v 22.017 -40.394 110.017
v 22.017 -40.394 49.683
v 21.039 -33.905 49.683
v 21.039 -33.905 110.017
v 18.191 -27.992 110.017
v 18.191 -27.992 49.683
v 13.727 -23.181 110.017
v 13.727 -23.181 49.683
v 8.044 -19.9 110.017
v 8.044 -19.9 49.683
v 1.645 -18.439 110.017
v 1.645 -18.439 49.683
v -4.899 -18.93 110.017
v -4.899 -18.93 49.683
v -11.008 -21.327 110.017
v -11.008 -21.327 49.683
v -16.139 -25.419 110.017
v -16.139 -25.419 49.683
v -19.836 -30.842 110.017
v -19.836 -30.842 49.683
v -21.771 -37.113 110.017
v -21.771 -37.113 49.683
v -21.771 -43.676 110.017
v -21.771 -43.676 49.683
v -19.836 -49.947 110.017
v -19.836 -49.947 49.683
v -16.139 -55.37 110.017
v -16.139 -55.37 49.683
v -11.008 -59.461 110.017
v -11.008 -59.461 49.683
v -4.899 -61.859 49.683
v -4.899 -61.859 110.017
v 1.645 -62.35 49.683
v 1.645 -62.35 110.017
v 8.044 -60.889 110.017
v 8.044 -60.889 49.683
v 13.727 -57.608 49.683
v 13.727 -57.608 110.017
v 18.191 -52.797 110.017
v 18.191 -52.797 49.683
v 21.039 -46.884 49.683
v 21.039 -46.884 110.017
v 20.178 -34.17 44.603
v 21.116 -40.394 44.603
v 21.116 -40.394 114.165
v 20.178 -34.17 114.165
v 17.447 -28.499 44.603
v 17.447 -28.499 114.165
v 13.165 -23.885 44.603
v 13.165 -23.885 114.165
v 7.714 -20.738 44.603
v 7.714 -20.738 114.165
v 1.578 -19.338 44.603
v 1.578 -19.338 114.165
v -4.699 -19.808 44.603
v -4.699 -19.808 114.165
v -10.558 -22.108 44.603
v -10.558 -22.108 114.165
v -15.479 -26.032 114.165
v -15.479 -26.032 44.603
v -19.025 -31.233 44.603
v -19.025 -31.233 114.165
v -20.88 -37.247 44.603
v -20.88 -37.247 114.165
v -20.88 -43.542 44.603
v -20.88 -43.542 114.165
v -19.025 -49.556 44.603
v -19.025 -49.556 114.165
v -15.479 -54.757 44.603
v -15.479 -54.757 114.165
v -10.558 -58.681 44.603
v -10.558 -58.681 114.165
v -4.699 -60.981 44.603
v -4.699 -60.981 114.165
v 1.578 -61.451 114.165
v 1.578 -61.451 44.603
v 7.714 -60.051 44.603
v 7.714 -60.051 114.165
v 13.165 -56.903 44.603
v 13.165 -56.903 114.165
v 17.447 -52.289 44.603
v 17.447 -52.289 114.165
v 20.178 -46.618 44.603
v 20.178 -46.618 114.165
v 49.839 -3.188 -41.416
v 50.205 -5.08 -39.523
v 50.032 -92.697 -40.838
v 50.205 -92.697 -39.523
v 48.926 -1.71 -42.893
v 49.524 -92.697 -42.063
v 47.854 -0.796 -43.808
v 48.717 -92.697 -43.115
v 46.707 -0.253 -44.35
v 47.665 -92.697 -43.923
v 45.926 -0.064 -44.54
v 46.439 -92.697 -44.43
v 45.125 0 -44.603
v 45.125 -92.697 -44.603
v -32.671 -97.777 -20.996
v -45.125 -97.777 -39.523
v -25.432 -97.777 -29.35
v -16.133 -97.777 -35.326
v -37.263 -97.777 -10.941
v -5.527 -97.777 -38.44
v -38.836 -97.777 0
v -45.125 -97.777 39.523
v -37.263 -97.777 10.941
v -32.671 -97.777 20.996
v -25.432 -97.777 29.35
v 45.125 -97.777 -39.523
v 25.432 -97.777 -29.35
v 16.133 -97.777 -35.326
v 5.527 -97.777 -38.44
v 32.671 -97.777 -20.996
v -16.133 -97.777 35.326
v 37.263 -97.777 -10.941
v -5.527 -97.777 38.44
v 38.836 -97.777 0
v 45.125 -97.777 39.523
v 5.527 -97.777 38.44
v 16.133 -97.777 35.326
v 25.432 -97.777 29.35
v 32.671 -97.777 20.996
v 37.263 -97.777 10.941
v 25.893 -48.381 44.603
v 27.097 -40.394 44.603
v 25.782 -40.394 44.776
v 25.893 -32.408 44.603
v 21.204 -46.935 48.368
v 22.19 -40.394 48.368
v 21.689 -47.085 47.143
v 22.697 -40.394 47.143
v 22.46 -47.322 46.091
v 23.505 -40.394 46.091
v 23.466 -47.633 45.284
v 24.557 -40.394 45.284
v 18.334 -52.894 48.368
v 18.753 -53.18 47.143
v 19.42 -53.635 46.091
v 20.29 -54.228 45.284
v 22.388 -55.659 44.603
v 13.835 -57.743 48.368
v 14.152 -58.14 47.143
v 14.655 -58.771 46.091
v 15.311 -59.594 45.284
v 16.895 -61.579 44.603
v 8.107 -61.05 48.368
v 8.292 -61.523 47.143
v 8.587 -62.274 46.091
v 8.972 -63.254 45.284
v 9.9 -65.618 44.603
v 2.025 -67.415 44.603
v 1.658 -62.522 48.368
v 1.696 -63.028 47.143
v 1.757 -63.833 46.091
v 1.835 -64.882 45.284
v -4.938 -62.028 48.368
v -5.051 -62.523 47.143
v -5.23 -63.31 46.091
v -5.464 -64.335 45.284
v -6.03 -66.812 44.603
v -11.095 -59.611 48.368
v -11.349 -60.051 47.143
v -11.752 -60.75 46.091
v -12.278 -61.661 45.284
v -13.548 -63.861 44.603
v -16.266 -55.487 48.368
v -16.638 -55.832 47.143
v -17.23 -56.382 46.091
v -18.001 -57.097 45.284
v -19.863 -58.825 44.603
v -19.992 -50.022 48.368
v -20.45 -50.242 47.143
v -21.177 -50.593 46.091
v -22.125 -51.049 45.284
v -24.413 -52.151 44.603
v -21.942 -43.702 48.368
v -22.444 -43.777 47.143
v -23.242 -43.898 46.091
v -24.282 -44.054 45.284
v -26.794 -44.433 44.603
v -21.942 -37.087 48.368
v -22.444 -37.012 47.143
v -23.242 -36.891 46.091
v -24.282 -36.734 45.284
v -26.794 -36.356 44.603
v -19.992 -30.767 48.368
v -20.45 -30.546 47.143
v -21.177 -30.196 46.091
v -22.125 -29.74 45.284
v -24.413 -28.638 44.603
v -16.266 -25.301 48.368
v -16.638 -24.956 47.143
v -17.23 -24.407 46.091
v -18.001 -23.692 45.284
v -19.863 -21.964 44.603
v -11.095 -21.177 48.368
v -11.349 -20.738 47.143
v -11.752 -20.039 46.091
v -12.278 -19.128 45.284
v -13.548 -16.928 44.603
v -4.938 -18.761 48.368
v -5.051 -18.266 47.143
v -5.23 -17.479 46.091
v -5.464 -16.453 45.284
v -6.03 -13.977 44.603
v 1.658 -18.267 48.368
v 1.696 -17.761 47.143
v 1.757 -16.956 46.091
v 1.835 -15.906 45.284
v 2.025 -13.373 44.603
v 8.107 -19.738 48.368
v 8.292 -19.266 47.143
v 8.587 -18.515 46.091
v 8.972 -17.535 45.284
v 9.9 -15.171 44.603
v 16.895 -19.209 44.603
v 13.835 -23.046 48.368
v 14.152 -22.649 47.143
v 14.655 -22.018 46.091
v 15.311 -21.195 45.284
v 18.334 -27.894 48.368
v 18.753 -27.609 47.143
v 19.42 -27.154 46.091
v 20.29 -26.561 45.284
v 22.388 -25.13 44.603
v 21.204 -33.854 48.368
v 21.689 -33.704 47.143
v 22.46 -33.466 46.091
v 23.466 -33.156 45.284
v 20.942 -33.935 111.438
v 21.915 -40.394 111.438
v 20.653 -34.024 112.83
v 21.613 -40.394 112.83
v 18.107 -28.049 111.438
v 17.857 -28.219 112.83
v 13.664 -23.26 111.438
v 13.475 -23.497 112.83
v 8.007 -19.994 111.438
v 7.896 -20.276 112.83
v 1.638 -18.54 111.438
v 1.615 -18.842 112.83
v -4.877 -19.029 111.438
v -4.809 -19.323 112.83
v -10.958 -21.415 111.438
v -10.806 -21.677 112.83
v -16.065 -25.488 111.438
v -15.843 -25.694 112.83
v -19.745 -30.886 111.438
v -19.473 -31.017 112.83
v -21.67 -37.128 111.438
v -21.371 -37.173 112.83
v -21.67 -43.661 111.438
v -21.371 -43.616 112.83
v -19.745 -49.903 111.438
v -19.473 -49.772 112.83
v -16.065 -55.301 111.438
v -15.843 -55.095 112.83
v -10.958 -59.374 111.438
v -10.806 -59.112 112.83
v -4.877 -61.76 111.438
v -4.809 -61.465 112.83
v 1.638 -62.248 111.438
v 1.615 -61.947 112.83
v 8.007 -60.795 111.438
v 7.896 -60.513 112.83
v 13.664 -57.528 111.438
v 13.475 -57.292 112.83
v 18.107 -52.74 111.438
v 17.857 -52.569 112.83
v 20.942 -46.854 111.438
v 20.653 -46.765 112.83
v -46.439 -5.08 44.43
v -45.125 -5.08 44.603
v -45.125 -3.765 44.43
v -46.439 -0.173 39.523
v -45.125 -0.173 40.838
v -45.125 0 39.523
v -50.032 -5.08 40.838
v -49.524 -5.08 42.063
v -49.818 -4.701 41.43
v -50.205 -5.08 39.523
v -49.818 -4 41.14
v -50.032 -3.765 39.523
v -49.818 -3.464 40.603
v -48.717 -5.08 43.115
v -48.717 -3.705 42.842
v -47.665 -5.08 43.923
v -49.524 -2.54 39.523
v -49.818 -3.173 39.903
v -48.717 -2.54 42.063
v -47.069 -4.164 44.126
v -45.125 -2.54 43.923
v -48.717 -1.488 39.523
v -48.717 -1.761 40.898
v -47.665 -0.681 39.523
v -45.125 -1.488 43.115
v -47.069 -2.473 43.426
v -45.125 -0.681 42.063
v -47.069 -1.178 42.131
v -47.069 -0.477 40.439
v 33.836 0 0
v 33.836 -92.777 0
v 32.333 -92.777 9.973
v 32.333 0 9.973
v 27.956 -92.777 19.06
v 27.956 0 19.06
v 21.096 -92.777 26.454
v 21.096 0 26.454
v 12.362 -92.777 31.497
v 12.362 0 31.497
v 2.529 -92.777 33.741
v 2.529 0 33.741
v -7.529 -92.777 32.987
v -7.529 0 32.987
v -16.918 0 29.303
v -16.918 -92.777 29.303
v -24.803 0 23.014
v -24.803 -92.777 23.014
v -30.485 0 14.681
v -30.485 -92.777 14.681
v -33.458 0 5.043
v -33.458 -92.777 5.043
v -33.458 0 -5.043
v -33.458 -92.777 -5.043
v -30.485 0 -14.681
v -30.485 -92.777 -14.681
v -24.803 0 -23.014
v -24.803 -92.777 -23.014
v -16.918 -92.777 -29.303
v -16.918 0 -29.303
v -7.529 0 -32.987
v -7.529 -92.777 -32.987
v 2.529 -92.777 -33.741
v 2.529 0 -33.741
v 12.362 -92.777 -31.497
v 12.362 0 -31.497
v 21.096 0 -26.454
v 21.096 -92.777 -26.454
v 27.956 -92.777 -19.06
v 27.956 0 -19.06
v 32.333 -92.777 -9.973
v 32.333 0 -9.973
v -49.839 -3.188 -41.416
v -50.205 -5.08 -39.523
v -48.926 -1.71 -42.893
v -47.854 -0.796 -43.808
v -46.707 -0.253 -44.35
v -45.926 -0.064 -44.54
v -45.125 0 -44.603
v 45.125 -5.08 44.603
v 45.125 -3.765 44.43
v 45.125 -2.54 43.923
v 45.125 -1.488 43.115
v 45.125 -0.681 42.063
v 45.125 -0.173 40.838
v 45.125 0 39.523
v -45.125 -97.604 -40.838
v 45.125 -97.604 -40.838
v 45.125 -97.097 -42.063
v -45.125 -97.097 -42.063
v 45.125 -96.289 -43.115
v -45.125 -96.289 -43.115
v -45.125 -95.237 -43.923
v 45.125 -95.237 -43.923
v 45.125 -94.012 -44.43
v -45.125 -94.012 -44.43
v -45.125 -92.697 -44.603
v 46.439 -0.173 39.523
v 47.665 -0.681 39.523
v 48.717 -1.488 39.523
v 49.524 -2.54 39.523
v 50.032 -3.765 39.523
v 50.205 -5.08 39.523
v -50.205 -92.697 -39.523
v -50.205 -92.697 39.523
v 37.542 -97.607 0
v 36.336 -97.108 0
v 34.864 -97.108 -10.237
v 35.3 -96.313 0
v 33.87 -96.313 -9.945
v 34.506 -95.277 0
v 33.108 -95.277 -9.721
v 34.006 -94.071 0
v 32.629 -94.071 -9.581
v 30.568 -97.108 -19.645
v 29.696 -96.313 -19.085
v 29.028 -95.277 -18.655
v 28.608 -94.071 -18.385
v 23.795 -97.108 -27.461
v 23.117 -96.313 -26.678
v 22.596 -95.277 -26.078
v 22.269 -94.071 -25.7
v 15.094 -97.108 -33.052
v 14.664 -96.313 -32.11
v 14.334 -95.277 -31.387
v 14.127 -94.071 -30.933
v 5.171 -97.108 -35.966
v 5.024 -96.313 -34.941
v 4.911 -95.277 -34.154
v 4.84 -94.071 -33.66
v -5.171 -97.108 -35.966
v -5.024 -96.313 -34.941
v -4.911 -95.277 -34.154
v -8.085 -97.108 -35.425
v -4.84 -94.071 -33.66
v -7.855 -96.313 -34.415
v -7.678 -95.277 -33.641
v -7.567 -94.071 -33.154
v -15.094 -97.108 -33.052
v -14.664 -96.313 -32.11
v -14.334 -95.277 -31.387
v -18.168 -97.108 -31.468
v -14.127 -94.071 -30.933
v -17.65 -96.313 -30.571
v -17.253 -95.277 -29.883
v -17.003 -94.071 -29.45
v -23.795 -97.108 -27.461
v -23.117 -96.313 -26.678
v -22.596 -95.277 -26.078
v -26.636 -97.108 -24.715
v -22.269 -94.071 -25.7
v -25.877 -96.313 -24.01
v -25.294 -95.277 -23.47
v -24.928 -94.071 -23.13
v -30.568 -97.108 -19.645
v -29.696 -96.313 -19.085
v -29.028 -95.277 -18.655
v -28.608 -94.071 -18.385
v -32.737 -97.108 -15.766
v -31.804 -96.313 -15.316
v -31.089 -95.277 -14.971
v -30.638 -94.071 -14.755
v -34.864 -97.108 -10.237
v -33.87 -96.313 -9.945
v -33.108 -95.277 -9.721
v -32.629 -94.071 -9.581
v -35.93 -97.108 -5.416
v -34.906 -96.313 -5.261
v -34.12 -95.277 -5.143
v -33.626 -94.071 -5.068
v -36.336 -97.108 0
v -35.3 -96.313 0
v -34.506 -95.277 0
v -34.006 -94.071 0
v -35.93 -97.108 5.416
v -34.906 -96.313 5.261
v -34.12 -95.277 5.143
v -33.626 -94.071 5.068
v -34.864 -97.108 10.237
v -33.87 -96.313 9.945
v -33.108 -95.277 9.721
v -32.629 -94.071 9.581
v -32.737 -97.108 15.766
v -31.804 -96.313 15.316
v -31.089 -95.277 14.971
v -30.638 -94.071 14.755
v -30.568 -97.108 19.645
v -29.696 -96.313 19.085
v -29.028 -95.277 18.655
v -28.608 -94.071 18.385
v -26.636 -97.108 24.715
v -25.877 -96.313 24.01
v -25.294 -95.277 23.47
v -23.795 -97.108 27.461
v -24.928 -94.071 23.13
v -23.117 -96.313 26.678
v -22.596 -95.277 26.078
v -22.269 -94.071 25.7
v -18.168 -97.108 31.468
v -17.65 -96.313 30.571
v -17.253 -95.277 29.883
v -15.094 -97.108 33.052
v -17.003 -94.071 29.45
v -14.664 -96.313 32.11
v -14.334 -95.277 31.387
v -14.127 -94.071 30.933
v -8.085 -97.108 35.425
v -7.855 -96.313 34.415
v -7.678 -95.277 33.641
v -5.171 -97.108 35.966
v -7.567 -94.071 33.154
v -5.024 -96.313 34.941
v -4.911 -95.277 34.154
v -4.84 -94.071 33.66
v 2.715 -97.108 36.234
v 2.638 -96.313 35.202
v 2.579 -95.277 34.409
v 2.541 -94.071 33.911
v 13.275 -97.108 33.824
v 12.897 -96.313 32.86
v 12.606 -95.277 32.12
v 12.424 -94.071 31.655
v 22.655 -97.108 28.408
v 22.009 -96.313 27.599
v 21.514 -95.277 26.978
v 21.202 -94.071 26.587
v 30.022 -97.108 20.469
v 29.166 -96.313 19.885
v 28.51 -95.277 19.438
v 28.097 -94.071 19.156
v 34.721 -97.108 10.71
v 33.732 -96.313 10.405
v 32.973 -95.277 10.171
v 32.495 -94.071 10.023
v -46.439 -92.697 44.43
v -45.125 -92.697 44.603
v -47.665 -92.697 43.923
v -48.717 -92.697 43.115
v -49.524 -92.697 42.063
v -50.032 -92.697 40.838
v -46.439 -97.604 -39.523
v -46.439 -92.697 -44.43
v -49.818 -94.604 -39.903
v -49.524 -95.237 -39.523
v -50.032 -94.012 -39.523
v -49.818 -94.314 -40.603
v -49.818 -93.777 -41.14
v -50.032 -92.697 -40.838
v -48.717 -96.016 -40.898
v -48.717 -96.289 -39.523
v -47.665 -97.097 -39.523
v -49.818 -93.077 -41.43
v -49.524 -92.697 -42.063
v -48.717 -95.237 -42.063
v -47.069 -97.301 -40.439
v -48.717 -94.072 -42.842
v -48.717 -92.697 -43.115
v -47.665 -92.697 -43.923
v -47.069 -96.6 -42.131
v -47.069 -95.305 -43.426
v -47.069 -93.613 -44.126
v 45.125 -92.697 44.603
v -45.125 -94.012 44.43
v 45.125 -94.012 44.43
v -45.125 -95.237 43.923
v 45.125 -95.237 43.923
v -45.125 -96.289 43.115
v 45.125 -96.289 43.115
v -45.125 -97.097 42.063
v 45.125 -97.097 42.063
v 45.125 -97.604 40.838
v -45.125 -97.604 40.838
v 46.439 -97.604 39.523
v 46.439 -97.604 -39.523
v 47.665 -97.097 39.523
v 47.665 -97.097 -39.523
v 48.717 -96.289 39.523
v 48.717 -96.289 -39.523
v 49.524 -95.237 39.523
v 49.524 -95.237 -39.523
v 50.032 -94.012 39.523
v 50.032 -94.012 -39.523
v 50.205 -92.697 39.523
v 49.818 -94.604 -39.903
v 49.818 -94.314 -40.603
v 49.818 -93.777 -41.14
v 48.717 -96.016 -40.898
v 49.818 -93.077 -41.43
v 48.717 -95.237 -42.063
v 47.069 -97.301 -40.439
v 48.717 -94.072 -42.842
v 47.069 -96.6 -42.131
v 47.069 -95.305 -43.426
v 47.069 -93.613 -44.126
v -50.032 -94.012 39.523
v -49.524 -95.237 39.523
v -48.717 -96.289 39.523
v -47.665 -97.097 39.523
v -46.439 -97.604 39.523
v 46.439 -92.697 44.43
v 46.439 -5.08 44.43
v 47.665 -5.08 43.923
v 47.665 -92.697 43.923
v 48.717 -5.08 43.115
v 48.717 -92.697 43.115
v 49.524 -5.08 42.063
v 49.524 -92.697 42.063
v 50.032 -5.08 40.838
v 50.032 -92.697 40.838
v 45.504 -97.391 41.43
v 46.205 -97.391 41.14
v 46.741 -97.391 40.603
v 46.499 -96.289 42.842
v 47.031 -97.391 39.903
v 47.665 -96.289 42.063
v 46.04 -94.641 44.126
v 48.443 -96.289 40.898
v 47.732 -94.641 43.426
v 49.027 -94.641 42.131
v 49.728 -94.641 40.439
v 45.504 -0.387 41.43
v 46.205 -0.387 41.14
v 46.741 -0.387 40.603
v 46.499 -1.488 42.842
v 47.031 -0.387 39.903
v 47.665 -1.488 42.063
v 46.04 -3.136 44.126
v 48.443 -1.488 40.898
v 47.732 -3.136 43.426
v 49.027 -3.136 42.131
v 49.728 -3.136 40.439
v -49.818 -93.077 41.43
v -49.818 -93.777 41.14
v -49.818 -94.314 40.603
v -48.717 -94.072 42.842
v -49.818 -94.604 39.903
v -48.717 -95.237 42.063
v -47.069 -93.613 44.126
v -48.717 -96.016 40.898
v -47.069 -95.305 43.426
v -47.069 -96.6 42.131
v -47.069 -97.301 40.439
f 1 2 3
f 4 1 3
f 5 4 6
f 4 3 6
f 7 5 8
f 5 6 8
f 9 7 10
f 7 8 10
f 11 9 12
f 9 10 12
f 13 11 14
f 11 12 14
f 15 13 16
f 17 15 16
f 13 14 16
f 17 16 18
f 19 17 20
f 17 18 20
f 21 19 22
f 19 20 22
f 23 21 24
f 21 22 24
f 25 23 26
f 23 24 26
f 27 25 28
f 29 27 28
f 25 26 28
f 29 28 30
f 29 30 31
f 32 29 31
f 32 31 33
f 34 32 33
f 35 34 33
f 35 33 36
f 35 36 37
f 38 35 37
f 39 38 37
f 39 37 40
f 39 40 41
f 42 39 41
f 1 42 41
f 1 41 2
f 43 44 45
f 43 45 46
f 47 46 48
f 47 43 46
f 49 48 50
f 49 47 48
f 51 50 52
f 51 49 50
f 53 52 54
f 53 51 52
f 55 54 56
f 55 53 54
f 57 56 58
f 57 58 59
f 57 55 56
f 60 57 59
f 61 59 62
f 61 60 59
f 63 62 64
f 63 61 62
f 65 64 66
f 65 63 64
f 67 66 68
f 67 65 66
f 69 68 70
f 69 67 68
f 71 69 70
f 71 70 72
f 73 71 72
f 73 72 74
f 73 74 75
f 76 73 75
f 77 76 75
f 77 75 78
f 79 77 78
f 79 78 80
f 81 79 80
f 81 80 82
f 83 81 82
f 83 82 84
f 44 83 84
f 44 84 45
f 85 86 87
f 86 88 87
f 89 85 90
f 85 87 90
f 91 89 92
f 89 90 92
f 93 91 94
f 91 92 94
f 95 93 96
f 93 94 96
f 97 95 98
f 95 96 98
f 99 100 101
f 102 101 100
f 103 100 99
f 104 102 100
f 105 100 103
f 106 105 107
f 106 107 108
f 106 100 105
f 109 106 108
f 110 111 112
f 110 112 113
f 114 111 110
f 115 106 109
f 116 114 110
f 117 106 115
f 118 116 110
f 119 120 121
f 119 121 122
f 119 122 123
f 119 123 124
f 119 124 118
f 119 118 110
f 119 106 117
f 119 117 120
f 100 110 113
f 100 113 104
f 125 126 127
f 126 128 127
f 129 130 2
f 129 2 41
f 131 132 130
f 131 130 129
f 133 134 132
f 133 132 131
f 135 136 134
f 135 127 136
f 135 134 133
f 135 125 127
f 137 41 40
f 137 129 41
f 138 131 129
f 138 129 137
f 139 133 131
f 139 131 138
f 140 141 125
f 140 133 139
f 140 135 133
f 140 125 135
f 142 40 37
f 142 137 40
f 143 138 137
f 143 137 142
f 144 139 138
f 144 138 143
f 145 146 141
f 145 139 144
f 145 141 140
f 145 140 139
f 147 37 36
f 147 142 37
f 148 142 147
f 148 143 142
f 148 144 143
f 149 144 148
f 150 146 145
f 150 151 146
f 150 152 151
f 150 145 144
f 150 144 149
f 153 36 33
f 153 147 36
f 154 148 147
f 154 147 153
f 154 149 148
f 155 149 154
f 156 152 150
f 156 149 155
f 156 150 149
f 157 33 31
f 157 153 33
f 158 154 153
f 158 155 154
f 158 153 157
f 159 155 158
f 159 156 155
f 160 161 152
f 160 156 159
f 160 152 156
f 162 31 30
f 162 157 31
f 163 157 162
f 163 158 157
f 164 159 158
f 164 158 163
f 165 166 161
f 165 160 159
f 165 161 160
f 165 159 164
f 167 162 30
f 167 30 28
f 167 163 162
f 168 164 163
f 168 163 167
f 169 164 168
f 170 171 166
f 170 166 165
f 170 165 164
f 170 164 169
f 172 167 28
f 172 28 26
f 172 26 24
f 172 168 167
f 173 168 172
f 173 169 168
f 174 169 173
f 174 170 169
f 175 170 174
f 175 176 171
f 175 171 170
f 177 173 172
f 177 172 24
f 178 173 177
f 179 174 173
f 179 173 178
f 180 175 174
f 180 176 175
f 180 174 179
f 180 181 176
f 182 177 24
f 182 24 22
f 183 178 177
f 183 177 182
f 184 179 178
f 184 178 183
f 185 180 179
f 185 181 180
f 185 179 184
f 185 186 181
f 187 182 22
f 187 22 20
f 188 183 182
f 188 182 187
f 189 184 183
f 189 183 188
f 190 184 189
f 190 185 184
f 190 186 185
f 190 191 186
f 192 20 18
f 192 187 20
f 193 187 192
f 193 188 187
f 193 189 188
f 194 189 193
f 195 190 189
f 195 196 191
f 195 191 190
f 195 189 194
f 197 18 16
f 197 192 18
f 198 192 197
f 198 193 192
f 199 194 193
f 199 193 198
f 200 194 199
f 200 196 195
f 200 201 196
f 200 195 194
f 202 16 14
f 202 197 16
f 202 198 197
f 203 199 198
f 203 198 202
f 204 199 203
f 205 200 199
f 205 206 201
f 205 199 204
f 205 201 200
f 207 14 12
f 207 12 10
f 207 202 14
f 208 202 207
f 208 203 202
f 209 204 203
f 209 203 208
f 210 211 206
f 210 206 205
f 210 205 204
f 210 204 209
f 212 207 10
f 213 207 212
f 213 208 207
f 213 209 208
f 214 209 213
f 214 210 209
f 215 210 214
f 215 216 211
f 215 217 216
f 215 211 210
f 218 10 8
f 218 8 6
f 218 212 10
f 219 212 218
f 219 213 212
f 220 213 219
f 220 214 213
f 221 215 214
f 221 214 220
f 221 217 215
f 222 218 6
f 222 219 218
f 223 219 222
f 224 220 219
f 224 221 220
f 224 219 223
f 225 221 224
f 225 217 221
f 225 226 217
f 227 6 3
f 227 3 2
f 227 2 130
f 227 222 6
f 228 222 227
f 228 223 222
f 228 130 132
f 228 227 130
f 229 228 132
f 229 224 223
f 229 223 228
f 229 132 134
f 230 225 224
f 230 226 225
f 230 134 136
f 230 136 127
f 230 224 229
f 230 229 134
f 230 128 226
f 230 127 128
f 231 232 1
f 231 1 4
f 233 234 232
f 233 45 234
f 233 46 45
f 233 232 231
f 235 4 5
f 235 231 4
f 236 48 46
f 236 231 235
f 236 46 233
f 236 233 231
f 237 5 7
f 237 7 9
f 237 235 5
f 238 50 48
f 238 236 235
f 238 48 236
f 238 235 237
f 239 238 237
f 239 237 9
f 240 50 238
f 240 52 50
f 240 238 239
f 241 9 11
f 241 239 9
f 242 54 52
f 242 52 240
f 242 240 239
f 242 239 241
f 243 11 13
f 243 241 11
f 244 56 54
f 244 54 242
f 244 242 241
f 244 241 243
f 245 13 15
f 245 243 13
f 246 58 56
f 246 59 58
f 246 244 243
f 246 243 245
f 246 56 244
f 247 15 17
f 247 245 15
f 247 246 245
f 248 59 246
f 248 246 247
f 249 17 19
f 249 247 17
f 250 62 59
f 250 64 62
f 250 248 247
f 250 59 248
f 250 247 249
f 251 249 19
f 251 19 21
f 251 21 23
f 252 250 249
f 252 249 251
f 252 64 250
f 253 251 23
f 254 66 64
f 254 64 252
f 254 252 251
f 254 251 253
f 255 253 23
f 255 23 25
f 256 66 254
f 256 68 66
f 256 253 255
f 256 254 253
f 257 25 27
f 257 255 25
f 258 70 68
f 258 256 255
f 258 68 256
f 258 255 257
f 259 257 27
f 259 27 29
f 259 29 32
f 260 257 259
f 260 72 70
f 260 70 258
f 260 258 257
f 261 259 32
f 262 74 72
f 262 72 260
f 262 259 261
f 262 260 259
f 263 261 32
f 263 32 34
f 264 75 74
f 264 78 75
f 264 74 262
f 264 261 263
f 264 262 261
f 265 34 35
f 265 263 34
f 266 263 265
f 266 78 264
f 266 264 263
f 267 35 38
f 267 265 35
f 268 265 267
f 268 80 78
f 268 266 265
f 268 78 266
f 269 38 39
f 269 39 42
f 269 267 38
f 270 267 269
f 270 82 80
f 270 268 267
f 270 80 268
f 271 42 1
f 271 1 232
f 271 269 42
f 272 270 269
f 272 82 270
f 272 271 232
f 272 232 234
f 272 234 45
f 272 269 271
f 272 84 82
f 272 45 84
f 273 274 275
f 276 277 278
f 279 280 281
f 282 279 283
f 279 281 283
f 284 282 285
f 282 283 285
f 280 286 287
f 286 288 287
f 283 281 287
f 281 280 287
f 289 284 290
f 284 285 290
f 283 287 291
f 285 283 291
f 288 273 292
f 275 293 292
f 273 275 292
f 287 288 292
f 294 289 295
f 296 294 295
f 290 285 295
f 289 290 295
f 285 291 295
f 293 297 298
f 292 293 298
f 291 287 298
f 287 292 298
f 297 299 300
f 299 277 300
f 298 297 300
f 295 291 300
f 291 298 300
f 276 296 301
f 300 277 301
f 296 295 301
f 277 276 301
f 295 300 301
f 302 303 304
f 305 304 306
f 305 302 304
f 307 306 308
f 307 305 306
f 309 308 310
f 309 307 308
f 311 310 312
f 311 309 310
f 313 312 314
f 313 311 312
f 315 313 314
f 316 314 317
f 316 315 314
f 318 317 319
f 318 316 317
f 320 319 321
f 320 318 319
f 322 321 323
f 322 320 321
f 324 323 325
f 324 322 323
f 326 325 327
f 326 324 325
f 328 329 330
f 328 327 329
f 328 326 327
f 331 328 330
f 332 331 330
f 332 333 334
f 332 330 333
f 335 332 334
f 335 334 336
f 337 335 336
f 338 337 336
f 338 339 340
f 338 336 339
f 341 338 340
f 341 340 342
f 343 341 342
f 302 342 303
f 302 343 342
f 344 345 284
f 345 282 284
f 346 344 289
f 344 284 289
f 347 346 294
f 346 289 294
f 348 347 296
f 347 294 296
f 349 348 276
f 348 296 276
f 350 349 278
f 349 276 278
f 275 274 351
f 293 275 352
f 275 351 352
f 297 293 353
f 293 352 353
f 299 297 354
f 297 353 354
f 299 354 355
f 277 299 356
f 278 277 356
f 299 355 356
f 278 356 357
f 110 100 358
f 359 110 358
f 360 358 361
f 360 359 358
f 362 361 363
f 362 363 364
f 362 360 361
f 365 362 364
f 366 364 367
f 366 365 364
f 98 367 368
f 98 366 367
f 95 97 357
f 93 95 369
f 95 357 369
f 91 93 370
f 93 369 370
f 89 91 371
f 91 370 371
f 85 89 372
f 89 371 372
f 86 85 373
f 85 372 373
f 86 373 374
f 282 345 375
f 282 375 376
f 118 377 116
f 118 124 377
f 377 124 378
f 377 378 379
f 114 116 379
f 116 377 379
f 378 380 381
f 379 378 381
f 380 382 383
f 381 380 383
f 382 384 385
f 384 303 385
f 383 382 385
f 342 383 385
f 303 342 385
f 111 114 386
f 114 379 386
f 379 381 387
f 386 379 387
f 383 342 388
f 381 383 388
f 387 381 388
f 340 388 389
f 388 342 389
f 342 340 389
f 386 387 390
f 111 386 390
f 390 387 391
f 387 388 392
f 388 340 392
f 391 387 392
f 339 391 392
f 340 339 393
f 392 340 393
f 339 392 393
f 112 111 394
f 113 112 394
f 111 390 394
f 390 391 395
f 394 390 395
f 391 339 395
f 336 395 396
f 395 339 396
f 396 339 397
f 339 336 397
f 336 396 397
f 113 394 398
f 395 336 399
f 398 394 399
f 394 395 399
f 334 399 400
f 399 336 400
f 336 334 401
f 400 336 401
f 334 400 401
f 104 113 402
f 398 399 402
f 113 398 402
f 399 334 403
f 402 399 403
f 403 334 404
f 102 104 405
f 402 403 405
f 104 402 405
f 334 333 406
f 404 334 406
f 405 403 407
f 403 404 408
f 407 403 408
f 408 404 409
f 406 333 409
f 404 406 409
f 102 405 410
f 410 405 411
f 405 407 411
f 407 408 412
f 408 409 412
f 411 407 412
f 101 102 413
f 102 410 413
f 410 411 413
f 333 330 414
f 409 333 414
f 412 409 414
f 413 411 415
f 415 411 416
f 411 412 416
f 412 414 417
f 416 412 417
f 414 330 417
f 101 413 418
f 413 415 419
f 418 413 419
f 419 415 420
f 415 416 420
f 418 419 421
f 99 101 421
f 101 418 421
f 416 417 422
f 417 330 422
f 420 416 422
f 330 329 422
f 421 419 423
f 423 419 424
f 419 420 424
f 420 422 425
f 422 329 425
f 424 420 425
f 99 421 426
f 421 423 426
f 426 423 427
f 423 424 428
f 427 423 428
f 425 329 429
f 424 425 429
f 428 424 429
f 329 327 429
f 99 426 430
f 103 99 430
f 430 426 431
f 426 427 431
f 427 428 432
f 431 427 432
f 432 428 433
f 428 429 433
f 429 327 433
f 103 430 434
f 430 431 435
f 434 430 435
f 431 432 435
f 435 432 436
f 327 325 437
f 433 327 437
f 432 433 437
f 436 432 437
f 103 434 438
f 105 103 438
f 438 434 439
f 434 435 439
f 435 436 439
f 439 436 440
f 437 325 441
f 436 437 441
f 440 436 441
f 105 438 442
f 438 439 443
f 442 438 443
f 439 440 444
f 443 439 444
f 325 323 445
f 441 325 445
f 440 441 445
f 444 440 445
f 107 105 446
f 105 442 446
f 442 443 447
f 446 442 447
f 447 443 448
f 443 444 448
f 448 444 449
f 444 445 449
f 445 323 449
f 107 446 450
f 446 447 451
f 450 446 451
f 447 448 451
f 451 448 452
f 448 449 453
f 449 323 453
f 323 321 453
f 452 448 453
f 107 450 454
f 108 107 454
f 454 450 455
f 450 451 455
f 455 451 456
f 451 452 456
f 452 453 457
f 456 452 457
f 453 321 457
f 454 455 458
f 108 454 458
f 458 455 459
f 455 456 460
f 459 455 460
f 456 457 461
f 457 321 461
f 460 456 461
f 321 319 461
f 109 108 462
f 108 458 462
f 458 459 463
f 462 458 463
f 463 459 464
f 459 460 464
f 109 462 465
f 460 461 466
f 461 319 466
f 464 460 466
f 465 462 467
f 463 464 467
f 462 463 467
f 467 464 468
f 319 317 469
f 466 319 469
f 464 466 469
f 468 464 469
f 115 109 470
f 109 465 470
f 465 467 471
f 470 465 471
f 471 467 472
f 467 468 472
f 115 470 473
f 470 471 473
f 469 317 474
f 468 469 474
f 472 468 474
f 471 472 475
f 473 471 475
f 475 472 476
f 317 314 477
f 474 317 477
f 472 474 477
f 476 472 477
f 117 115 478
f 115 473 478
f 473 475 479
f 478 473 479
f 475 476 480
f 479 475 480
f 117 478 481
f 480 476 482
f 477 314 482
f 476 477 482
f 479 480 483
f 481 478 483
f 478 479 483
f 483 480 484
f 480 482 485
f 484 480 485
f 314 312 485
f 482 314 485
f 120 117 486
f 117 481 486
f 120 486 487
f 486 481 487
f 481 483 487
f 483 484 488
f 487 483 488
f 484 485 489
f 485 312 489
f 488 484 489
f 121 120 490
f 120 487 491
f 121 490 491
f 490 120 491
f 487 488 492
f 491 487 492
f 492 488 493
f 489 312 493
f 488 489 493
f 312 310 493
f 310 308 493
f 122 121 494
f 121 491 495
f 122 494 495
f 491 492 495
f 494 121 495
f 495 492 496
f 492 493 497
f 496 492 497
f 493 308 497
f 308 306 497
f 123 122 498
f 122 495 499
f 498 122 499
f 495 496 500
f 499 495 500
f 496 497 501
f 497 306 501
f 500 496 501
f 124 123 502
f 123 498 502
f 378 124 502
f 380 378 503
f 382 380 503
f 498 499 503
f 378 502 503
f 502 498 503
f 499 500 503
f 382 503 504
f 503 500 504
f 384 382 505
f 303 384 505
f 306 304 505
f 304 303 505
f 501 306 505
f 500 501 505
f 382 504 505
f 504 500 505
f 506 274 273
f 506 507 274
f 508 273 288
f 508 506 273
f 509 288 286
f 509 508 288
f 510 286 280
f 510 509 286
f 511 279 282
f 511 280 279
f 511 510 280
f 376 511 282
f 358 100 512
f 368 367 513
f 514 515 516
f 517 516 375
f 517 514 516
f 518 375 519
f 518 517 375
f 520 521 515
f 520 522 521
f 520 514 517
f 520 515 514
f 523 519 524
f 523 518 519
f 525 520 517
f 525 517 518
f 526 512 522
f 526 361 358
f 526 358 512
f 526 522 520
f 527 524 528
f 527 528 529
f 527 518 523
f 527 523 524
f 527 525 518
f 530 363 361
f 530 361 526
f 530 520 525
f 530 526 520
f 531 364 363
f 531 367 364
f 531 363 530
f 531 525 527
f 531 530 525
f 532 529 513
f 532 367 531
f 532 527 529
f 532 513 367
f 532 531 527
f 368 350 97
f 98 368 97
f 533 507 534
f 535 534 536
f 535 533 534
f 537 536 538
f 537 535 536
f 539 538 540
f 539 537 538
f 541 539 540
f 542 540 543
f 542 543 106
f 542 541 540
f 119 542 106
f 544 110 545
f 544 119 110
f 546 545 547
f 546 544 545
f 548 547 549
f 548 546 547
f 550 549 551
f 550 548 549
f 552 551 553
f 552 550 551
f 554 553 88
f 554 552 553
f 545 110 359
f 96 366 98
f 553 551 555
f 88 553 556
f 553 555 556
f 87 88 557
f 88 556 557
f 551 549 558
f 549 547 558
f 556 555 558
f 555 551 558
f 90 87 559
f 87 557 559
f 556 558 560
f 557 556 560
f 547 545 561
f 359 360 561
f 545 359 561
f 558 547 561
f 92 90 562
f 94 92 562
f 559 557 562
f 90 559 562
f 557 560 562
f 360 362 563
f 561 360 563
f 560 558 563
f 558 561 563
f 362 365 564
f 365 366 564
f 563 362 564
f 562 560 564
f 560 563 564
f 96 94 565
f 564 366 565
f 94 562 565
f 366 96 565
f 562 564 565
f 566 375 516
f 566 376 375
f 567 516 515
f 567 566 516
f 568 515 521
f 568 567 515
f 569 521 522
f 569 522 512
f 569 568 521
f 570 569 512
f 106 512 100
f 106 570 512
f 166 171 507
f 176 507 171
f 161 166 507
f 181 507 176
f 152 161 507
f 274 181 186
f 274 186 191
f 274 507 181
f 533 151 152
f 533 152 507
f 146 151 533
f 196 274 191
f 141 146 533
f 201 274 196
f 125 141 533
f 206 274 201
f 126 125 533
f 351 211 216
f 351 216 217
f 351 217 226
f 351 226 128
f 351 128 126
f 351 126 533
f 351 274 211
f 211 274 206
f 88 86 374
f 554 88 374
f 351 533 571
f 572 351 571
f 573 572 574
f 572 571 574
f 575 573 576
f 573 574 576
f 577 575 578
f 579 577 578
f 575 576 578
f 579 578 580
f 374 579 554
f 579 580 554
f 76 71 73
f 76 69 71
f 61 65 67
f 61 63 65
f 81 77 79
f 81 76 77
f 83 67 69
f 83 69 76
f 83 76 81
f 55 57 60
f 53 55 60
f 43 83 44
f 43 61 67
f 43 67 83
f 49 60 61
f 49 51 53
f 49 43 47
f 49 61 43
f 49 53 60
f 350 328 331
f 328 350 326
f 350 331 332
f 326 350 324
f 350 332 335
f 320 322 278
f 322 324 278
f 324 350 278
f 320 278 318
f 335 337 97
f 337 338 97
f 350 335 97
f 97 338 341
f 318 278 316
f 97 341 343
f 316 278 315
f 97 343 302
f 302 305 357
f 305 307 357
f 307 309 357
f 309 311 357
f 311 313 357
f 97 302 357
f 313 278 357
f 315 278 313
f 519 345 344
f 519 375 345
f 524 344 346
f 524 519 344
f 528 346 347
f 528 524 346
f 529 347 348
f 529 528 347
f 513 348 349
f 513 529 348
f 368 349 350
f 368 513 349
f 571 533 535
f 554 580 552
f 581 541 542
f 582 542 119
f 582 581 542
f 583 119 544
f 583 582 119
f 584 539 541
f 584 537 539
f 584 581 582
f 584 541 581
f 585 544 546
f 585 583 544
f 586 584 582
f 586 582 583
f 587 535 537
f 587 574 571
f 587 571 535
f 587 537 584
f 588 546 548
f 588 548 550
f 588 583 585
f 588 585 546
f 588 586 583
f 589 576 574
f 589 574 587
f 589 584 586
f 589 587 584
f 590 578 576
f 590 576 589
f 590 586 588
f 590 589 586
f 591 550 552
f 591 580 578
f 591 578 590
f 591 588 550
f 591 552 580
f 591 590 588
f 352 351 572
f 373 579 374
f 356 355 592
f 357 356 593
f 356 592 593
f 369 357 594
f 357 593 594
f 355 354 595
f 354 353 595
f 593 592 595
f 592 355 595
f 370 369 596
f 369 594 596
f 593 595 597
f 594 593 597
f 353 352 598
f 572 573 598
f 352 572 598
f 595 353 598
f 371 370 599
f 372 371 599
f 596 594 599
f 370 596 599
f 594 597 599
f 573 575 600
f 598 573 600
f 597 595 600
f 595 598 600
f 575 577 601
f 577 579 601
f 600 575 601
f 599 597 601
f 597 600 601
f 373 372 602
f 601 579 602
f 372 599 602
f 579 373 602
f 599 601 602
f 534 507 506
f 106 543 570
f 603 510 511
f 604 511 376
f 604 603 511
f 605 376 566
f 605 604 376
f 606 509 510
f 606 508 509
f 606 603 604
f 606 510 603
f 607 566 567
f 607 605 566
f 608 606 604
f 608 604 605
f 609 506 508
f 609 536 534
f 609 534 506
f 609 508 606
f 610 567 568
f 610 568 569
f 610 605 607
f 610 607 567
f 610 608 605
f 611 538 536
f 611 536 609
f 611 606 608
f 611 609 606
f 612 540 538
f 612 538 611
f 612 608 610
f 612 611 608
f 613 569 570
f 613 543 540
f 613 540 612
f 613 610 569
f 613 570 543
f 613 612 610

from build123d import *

# Parameters (mm, degrees)
F0_W     = 100.4092097282
F0_H     = 89.206546545
F1_DEPTH = 97.7773964405
F2_R     = 22.0167060196
F2_R_2   = 21.115809679
F3_DEPTH = 114.1652464867
F4_R     = 5.08
F5_R     = 33.8357748328
F6_DEPTH = 98.3386710286
F7_R     = 5


# Not quite as in the source:
# - a fillet or chamfer that OpenCascade refuses, or shapes differently, is made with other operations: its cross-section is extruded or revolved along the edge and cut away or added
# - the program builds the solid bodies; features that only make, move or delete a surface that nothing else refers to are left out


with BuildPart() as f1:
    # F0 (on Front) → F1 (new body)
    with BuildSketch(Plane.XZ):
        Rectangle(F0_W, F0_H)
    extrude(amount=F1_DEPTH)

    # F2 (on Top) → F3 (join)
    with BuildSketch(Plane.XY):
        with Locations((0, -40.3943955898)):
            Circle(F2_R)
        with Locations((0, -40.3943955898)):
            Circle(F2_R_2, mode=Mode.SUBTRACT)
    extrude(amount=F3_DEPTH)

    # F4
    f4_edges = [f1.edges().sort_by_distance(p)[0] for p in [
        (50.204605, -48.888698, 44.603273),
        (0, 0, 44.603273),
        (0, -97.777396, 44.603273),
        (-50.204605, -48.888698, 44.603273),
        (-22.016706, -40.394396, 44.603273),
        (0, -97.777396, -44.603273),
        (50.204605, -97.777396, 0),
        (-50.204605, -97.777396, 0),
        (-50.204605, -48.888698, -44.603273),
        (-50.204605, 0, 0),
        (50.204605, -48.888698, -44.603273),
        (50.204605, 0, 0),
    ]]
    fillet(f4_edges, radius=F4_R)

    # F5 (on Front) → F6 (cut)
    with BuildSketch(Plane.XZ):
        Circle(F5_R)
    extrude(amount=F6_DEPTH, mode=Mode.SUBTRACT)

    # F7
    f7_edges = [f1.edges().sort_by_distance(p)[0] for p in [
        (50.204605, -48.888698, 39.523273),
        (50.204605, -5.08, 0),
        (50.204605, -92.697396, 0),
        (50.204605, -48.888698, -39.523273),
        (-33.835775, -97.777396, 0),
    ]]
    fillet(f7_edges, radius=F7_R)

    # F10: fillet of radius 10 on 1 edges, made by hand

    # F10_s1 → F10_t2 (revolve, cut)
    with BuildSketch(Plane.XZ.offset(40.3943955898)):
        with BuildLine():
            ThreePointArc((22.0167060196, 110.017197235), (21.7888868559, 112.1395736631), (21.115809679, 114.1652464867))
            Line((21.115809679, 114.1652464867), (22.0167060196, 114.1652464867))
            Line((22.0167060196, 114.1652464867), (22.0167060196, 110.017197235))
        make_face()
    revolve(axis=Axis((0, -40.3943955898, 114.1652464867), (0, 0, 1)), mode=Mode.SUBTRACT)


solid = f1.part
